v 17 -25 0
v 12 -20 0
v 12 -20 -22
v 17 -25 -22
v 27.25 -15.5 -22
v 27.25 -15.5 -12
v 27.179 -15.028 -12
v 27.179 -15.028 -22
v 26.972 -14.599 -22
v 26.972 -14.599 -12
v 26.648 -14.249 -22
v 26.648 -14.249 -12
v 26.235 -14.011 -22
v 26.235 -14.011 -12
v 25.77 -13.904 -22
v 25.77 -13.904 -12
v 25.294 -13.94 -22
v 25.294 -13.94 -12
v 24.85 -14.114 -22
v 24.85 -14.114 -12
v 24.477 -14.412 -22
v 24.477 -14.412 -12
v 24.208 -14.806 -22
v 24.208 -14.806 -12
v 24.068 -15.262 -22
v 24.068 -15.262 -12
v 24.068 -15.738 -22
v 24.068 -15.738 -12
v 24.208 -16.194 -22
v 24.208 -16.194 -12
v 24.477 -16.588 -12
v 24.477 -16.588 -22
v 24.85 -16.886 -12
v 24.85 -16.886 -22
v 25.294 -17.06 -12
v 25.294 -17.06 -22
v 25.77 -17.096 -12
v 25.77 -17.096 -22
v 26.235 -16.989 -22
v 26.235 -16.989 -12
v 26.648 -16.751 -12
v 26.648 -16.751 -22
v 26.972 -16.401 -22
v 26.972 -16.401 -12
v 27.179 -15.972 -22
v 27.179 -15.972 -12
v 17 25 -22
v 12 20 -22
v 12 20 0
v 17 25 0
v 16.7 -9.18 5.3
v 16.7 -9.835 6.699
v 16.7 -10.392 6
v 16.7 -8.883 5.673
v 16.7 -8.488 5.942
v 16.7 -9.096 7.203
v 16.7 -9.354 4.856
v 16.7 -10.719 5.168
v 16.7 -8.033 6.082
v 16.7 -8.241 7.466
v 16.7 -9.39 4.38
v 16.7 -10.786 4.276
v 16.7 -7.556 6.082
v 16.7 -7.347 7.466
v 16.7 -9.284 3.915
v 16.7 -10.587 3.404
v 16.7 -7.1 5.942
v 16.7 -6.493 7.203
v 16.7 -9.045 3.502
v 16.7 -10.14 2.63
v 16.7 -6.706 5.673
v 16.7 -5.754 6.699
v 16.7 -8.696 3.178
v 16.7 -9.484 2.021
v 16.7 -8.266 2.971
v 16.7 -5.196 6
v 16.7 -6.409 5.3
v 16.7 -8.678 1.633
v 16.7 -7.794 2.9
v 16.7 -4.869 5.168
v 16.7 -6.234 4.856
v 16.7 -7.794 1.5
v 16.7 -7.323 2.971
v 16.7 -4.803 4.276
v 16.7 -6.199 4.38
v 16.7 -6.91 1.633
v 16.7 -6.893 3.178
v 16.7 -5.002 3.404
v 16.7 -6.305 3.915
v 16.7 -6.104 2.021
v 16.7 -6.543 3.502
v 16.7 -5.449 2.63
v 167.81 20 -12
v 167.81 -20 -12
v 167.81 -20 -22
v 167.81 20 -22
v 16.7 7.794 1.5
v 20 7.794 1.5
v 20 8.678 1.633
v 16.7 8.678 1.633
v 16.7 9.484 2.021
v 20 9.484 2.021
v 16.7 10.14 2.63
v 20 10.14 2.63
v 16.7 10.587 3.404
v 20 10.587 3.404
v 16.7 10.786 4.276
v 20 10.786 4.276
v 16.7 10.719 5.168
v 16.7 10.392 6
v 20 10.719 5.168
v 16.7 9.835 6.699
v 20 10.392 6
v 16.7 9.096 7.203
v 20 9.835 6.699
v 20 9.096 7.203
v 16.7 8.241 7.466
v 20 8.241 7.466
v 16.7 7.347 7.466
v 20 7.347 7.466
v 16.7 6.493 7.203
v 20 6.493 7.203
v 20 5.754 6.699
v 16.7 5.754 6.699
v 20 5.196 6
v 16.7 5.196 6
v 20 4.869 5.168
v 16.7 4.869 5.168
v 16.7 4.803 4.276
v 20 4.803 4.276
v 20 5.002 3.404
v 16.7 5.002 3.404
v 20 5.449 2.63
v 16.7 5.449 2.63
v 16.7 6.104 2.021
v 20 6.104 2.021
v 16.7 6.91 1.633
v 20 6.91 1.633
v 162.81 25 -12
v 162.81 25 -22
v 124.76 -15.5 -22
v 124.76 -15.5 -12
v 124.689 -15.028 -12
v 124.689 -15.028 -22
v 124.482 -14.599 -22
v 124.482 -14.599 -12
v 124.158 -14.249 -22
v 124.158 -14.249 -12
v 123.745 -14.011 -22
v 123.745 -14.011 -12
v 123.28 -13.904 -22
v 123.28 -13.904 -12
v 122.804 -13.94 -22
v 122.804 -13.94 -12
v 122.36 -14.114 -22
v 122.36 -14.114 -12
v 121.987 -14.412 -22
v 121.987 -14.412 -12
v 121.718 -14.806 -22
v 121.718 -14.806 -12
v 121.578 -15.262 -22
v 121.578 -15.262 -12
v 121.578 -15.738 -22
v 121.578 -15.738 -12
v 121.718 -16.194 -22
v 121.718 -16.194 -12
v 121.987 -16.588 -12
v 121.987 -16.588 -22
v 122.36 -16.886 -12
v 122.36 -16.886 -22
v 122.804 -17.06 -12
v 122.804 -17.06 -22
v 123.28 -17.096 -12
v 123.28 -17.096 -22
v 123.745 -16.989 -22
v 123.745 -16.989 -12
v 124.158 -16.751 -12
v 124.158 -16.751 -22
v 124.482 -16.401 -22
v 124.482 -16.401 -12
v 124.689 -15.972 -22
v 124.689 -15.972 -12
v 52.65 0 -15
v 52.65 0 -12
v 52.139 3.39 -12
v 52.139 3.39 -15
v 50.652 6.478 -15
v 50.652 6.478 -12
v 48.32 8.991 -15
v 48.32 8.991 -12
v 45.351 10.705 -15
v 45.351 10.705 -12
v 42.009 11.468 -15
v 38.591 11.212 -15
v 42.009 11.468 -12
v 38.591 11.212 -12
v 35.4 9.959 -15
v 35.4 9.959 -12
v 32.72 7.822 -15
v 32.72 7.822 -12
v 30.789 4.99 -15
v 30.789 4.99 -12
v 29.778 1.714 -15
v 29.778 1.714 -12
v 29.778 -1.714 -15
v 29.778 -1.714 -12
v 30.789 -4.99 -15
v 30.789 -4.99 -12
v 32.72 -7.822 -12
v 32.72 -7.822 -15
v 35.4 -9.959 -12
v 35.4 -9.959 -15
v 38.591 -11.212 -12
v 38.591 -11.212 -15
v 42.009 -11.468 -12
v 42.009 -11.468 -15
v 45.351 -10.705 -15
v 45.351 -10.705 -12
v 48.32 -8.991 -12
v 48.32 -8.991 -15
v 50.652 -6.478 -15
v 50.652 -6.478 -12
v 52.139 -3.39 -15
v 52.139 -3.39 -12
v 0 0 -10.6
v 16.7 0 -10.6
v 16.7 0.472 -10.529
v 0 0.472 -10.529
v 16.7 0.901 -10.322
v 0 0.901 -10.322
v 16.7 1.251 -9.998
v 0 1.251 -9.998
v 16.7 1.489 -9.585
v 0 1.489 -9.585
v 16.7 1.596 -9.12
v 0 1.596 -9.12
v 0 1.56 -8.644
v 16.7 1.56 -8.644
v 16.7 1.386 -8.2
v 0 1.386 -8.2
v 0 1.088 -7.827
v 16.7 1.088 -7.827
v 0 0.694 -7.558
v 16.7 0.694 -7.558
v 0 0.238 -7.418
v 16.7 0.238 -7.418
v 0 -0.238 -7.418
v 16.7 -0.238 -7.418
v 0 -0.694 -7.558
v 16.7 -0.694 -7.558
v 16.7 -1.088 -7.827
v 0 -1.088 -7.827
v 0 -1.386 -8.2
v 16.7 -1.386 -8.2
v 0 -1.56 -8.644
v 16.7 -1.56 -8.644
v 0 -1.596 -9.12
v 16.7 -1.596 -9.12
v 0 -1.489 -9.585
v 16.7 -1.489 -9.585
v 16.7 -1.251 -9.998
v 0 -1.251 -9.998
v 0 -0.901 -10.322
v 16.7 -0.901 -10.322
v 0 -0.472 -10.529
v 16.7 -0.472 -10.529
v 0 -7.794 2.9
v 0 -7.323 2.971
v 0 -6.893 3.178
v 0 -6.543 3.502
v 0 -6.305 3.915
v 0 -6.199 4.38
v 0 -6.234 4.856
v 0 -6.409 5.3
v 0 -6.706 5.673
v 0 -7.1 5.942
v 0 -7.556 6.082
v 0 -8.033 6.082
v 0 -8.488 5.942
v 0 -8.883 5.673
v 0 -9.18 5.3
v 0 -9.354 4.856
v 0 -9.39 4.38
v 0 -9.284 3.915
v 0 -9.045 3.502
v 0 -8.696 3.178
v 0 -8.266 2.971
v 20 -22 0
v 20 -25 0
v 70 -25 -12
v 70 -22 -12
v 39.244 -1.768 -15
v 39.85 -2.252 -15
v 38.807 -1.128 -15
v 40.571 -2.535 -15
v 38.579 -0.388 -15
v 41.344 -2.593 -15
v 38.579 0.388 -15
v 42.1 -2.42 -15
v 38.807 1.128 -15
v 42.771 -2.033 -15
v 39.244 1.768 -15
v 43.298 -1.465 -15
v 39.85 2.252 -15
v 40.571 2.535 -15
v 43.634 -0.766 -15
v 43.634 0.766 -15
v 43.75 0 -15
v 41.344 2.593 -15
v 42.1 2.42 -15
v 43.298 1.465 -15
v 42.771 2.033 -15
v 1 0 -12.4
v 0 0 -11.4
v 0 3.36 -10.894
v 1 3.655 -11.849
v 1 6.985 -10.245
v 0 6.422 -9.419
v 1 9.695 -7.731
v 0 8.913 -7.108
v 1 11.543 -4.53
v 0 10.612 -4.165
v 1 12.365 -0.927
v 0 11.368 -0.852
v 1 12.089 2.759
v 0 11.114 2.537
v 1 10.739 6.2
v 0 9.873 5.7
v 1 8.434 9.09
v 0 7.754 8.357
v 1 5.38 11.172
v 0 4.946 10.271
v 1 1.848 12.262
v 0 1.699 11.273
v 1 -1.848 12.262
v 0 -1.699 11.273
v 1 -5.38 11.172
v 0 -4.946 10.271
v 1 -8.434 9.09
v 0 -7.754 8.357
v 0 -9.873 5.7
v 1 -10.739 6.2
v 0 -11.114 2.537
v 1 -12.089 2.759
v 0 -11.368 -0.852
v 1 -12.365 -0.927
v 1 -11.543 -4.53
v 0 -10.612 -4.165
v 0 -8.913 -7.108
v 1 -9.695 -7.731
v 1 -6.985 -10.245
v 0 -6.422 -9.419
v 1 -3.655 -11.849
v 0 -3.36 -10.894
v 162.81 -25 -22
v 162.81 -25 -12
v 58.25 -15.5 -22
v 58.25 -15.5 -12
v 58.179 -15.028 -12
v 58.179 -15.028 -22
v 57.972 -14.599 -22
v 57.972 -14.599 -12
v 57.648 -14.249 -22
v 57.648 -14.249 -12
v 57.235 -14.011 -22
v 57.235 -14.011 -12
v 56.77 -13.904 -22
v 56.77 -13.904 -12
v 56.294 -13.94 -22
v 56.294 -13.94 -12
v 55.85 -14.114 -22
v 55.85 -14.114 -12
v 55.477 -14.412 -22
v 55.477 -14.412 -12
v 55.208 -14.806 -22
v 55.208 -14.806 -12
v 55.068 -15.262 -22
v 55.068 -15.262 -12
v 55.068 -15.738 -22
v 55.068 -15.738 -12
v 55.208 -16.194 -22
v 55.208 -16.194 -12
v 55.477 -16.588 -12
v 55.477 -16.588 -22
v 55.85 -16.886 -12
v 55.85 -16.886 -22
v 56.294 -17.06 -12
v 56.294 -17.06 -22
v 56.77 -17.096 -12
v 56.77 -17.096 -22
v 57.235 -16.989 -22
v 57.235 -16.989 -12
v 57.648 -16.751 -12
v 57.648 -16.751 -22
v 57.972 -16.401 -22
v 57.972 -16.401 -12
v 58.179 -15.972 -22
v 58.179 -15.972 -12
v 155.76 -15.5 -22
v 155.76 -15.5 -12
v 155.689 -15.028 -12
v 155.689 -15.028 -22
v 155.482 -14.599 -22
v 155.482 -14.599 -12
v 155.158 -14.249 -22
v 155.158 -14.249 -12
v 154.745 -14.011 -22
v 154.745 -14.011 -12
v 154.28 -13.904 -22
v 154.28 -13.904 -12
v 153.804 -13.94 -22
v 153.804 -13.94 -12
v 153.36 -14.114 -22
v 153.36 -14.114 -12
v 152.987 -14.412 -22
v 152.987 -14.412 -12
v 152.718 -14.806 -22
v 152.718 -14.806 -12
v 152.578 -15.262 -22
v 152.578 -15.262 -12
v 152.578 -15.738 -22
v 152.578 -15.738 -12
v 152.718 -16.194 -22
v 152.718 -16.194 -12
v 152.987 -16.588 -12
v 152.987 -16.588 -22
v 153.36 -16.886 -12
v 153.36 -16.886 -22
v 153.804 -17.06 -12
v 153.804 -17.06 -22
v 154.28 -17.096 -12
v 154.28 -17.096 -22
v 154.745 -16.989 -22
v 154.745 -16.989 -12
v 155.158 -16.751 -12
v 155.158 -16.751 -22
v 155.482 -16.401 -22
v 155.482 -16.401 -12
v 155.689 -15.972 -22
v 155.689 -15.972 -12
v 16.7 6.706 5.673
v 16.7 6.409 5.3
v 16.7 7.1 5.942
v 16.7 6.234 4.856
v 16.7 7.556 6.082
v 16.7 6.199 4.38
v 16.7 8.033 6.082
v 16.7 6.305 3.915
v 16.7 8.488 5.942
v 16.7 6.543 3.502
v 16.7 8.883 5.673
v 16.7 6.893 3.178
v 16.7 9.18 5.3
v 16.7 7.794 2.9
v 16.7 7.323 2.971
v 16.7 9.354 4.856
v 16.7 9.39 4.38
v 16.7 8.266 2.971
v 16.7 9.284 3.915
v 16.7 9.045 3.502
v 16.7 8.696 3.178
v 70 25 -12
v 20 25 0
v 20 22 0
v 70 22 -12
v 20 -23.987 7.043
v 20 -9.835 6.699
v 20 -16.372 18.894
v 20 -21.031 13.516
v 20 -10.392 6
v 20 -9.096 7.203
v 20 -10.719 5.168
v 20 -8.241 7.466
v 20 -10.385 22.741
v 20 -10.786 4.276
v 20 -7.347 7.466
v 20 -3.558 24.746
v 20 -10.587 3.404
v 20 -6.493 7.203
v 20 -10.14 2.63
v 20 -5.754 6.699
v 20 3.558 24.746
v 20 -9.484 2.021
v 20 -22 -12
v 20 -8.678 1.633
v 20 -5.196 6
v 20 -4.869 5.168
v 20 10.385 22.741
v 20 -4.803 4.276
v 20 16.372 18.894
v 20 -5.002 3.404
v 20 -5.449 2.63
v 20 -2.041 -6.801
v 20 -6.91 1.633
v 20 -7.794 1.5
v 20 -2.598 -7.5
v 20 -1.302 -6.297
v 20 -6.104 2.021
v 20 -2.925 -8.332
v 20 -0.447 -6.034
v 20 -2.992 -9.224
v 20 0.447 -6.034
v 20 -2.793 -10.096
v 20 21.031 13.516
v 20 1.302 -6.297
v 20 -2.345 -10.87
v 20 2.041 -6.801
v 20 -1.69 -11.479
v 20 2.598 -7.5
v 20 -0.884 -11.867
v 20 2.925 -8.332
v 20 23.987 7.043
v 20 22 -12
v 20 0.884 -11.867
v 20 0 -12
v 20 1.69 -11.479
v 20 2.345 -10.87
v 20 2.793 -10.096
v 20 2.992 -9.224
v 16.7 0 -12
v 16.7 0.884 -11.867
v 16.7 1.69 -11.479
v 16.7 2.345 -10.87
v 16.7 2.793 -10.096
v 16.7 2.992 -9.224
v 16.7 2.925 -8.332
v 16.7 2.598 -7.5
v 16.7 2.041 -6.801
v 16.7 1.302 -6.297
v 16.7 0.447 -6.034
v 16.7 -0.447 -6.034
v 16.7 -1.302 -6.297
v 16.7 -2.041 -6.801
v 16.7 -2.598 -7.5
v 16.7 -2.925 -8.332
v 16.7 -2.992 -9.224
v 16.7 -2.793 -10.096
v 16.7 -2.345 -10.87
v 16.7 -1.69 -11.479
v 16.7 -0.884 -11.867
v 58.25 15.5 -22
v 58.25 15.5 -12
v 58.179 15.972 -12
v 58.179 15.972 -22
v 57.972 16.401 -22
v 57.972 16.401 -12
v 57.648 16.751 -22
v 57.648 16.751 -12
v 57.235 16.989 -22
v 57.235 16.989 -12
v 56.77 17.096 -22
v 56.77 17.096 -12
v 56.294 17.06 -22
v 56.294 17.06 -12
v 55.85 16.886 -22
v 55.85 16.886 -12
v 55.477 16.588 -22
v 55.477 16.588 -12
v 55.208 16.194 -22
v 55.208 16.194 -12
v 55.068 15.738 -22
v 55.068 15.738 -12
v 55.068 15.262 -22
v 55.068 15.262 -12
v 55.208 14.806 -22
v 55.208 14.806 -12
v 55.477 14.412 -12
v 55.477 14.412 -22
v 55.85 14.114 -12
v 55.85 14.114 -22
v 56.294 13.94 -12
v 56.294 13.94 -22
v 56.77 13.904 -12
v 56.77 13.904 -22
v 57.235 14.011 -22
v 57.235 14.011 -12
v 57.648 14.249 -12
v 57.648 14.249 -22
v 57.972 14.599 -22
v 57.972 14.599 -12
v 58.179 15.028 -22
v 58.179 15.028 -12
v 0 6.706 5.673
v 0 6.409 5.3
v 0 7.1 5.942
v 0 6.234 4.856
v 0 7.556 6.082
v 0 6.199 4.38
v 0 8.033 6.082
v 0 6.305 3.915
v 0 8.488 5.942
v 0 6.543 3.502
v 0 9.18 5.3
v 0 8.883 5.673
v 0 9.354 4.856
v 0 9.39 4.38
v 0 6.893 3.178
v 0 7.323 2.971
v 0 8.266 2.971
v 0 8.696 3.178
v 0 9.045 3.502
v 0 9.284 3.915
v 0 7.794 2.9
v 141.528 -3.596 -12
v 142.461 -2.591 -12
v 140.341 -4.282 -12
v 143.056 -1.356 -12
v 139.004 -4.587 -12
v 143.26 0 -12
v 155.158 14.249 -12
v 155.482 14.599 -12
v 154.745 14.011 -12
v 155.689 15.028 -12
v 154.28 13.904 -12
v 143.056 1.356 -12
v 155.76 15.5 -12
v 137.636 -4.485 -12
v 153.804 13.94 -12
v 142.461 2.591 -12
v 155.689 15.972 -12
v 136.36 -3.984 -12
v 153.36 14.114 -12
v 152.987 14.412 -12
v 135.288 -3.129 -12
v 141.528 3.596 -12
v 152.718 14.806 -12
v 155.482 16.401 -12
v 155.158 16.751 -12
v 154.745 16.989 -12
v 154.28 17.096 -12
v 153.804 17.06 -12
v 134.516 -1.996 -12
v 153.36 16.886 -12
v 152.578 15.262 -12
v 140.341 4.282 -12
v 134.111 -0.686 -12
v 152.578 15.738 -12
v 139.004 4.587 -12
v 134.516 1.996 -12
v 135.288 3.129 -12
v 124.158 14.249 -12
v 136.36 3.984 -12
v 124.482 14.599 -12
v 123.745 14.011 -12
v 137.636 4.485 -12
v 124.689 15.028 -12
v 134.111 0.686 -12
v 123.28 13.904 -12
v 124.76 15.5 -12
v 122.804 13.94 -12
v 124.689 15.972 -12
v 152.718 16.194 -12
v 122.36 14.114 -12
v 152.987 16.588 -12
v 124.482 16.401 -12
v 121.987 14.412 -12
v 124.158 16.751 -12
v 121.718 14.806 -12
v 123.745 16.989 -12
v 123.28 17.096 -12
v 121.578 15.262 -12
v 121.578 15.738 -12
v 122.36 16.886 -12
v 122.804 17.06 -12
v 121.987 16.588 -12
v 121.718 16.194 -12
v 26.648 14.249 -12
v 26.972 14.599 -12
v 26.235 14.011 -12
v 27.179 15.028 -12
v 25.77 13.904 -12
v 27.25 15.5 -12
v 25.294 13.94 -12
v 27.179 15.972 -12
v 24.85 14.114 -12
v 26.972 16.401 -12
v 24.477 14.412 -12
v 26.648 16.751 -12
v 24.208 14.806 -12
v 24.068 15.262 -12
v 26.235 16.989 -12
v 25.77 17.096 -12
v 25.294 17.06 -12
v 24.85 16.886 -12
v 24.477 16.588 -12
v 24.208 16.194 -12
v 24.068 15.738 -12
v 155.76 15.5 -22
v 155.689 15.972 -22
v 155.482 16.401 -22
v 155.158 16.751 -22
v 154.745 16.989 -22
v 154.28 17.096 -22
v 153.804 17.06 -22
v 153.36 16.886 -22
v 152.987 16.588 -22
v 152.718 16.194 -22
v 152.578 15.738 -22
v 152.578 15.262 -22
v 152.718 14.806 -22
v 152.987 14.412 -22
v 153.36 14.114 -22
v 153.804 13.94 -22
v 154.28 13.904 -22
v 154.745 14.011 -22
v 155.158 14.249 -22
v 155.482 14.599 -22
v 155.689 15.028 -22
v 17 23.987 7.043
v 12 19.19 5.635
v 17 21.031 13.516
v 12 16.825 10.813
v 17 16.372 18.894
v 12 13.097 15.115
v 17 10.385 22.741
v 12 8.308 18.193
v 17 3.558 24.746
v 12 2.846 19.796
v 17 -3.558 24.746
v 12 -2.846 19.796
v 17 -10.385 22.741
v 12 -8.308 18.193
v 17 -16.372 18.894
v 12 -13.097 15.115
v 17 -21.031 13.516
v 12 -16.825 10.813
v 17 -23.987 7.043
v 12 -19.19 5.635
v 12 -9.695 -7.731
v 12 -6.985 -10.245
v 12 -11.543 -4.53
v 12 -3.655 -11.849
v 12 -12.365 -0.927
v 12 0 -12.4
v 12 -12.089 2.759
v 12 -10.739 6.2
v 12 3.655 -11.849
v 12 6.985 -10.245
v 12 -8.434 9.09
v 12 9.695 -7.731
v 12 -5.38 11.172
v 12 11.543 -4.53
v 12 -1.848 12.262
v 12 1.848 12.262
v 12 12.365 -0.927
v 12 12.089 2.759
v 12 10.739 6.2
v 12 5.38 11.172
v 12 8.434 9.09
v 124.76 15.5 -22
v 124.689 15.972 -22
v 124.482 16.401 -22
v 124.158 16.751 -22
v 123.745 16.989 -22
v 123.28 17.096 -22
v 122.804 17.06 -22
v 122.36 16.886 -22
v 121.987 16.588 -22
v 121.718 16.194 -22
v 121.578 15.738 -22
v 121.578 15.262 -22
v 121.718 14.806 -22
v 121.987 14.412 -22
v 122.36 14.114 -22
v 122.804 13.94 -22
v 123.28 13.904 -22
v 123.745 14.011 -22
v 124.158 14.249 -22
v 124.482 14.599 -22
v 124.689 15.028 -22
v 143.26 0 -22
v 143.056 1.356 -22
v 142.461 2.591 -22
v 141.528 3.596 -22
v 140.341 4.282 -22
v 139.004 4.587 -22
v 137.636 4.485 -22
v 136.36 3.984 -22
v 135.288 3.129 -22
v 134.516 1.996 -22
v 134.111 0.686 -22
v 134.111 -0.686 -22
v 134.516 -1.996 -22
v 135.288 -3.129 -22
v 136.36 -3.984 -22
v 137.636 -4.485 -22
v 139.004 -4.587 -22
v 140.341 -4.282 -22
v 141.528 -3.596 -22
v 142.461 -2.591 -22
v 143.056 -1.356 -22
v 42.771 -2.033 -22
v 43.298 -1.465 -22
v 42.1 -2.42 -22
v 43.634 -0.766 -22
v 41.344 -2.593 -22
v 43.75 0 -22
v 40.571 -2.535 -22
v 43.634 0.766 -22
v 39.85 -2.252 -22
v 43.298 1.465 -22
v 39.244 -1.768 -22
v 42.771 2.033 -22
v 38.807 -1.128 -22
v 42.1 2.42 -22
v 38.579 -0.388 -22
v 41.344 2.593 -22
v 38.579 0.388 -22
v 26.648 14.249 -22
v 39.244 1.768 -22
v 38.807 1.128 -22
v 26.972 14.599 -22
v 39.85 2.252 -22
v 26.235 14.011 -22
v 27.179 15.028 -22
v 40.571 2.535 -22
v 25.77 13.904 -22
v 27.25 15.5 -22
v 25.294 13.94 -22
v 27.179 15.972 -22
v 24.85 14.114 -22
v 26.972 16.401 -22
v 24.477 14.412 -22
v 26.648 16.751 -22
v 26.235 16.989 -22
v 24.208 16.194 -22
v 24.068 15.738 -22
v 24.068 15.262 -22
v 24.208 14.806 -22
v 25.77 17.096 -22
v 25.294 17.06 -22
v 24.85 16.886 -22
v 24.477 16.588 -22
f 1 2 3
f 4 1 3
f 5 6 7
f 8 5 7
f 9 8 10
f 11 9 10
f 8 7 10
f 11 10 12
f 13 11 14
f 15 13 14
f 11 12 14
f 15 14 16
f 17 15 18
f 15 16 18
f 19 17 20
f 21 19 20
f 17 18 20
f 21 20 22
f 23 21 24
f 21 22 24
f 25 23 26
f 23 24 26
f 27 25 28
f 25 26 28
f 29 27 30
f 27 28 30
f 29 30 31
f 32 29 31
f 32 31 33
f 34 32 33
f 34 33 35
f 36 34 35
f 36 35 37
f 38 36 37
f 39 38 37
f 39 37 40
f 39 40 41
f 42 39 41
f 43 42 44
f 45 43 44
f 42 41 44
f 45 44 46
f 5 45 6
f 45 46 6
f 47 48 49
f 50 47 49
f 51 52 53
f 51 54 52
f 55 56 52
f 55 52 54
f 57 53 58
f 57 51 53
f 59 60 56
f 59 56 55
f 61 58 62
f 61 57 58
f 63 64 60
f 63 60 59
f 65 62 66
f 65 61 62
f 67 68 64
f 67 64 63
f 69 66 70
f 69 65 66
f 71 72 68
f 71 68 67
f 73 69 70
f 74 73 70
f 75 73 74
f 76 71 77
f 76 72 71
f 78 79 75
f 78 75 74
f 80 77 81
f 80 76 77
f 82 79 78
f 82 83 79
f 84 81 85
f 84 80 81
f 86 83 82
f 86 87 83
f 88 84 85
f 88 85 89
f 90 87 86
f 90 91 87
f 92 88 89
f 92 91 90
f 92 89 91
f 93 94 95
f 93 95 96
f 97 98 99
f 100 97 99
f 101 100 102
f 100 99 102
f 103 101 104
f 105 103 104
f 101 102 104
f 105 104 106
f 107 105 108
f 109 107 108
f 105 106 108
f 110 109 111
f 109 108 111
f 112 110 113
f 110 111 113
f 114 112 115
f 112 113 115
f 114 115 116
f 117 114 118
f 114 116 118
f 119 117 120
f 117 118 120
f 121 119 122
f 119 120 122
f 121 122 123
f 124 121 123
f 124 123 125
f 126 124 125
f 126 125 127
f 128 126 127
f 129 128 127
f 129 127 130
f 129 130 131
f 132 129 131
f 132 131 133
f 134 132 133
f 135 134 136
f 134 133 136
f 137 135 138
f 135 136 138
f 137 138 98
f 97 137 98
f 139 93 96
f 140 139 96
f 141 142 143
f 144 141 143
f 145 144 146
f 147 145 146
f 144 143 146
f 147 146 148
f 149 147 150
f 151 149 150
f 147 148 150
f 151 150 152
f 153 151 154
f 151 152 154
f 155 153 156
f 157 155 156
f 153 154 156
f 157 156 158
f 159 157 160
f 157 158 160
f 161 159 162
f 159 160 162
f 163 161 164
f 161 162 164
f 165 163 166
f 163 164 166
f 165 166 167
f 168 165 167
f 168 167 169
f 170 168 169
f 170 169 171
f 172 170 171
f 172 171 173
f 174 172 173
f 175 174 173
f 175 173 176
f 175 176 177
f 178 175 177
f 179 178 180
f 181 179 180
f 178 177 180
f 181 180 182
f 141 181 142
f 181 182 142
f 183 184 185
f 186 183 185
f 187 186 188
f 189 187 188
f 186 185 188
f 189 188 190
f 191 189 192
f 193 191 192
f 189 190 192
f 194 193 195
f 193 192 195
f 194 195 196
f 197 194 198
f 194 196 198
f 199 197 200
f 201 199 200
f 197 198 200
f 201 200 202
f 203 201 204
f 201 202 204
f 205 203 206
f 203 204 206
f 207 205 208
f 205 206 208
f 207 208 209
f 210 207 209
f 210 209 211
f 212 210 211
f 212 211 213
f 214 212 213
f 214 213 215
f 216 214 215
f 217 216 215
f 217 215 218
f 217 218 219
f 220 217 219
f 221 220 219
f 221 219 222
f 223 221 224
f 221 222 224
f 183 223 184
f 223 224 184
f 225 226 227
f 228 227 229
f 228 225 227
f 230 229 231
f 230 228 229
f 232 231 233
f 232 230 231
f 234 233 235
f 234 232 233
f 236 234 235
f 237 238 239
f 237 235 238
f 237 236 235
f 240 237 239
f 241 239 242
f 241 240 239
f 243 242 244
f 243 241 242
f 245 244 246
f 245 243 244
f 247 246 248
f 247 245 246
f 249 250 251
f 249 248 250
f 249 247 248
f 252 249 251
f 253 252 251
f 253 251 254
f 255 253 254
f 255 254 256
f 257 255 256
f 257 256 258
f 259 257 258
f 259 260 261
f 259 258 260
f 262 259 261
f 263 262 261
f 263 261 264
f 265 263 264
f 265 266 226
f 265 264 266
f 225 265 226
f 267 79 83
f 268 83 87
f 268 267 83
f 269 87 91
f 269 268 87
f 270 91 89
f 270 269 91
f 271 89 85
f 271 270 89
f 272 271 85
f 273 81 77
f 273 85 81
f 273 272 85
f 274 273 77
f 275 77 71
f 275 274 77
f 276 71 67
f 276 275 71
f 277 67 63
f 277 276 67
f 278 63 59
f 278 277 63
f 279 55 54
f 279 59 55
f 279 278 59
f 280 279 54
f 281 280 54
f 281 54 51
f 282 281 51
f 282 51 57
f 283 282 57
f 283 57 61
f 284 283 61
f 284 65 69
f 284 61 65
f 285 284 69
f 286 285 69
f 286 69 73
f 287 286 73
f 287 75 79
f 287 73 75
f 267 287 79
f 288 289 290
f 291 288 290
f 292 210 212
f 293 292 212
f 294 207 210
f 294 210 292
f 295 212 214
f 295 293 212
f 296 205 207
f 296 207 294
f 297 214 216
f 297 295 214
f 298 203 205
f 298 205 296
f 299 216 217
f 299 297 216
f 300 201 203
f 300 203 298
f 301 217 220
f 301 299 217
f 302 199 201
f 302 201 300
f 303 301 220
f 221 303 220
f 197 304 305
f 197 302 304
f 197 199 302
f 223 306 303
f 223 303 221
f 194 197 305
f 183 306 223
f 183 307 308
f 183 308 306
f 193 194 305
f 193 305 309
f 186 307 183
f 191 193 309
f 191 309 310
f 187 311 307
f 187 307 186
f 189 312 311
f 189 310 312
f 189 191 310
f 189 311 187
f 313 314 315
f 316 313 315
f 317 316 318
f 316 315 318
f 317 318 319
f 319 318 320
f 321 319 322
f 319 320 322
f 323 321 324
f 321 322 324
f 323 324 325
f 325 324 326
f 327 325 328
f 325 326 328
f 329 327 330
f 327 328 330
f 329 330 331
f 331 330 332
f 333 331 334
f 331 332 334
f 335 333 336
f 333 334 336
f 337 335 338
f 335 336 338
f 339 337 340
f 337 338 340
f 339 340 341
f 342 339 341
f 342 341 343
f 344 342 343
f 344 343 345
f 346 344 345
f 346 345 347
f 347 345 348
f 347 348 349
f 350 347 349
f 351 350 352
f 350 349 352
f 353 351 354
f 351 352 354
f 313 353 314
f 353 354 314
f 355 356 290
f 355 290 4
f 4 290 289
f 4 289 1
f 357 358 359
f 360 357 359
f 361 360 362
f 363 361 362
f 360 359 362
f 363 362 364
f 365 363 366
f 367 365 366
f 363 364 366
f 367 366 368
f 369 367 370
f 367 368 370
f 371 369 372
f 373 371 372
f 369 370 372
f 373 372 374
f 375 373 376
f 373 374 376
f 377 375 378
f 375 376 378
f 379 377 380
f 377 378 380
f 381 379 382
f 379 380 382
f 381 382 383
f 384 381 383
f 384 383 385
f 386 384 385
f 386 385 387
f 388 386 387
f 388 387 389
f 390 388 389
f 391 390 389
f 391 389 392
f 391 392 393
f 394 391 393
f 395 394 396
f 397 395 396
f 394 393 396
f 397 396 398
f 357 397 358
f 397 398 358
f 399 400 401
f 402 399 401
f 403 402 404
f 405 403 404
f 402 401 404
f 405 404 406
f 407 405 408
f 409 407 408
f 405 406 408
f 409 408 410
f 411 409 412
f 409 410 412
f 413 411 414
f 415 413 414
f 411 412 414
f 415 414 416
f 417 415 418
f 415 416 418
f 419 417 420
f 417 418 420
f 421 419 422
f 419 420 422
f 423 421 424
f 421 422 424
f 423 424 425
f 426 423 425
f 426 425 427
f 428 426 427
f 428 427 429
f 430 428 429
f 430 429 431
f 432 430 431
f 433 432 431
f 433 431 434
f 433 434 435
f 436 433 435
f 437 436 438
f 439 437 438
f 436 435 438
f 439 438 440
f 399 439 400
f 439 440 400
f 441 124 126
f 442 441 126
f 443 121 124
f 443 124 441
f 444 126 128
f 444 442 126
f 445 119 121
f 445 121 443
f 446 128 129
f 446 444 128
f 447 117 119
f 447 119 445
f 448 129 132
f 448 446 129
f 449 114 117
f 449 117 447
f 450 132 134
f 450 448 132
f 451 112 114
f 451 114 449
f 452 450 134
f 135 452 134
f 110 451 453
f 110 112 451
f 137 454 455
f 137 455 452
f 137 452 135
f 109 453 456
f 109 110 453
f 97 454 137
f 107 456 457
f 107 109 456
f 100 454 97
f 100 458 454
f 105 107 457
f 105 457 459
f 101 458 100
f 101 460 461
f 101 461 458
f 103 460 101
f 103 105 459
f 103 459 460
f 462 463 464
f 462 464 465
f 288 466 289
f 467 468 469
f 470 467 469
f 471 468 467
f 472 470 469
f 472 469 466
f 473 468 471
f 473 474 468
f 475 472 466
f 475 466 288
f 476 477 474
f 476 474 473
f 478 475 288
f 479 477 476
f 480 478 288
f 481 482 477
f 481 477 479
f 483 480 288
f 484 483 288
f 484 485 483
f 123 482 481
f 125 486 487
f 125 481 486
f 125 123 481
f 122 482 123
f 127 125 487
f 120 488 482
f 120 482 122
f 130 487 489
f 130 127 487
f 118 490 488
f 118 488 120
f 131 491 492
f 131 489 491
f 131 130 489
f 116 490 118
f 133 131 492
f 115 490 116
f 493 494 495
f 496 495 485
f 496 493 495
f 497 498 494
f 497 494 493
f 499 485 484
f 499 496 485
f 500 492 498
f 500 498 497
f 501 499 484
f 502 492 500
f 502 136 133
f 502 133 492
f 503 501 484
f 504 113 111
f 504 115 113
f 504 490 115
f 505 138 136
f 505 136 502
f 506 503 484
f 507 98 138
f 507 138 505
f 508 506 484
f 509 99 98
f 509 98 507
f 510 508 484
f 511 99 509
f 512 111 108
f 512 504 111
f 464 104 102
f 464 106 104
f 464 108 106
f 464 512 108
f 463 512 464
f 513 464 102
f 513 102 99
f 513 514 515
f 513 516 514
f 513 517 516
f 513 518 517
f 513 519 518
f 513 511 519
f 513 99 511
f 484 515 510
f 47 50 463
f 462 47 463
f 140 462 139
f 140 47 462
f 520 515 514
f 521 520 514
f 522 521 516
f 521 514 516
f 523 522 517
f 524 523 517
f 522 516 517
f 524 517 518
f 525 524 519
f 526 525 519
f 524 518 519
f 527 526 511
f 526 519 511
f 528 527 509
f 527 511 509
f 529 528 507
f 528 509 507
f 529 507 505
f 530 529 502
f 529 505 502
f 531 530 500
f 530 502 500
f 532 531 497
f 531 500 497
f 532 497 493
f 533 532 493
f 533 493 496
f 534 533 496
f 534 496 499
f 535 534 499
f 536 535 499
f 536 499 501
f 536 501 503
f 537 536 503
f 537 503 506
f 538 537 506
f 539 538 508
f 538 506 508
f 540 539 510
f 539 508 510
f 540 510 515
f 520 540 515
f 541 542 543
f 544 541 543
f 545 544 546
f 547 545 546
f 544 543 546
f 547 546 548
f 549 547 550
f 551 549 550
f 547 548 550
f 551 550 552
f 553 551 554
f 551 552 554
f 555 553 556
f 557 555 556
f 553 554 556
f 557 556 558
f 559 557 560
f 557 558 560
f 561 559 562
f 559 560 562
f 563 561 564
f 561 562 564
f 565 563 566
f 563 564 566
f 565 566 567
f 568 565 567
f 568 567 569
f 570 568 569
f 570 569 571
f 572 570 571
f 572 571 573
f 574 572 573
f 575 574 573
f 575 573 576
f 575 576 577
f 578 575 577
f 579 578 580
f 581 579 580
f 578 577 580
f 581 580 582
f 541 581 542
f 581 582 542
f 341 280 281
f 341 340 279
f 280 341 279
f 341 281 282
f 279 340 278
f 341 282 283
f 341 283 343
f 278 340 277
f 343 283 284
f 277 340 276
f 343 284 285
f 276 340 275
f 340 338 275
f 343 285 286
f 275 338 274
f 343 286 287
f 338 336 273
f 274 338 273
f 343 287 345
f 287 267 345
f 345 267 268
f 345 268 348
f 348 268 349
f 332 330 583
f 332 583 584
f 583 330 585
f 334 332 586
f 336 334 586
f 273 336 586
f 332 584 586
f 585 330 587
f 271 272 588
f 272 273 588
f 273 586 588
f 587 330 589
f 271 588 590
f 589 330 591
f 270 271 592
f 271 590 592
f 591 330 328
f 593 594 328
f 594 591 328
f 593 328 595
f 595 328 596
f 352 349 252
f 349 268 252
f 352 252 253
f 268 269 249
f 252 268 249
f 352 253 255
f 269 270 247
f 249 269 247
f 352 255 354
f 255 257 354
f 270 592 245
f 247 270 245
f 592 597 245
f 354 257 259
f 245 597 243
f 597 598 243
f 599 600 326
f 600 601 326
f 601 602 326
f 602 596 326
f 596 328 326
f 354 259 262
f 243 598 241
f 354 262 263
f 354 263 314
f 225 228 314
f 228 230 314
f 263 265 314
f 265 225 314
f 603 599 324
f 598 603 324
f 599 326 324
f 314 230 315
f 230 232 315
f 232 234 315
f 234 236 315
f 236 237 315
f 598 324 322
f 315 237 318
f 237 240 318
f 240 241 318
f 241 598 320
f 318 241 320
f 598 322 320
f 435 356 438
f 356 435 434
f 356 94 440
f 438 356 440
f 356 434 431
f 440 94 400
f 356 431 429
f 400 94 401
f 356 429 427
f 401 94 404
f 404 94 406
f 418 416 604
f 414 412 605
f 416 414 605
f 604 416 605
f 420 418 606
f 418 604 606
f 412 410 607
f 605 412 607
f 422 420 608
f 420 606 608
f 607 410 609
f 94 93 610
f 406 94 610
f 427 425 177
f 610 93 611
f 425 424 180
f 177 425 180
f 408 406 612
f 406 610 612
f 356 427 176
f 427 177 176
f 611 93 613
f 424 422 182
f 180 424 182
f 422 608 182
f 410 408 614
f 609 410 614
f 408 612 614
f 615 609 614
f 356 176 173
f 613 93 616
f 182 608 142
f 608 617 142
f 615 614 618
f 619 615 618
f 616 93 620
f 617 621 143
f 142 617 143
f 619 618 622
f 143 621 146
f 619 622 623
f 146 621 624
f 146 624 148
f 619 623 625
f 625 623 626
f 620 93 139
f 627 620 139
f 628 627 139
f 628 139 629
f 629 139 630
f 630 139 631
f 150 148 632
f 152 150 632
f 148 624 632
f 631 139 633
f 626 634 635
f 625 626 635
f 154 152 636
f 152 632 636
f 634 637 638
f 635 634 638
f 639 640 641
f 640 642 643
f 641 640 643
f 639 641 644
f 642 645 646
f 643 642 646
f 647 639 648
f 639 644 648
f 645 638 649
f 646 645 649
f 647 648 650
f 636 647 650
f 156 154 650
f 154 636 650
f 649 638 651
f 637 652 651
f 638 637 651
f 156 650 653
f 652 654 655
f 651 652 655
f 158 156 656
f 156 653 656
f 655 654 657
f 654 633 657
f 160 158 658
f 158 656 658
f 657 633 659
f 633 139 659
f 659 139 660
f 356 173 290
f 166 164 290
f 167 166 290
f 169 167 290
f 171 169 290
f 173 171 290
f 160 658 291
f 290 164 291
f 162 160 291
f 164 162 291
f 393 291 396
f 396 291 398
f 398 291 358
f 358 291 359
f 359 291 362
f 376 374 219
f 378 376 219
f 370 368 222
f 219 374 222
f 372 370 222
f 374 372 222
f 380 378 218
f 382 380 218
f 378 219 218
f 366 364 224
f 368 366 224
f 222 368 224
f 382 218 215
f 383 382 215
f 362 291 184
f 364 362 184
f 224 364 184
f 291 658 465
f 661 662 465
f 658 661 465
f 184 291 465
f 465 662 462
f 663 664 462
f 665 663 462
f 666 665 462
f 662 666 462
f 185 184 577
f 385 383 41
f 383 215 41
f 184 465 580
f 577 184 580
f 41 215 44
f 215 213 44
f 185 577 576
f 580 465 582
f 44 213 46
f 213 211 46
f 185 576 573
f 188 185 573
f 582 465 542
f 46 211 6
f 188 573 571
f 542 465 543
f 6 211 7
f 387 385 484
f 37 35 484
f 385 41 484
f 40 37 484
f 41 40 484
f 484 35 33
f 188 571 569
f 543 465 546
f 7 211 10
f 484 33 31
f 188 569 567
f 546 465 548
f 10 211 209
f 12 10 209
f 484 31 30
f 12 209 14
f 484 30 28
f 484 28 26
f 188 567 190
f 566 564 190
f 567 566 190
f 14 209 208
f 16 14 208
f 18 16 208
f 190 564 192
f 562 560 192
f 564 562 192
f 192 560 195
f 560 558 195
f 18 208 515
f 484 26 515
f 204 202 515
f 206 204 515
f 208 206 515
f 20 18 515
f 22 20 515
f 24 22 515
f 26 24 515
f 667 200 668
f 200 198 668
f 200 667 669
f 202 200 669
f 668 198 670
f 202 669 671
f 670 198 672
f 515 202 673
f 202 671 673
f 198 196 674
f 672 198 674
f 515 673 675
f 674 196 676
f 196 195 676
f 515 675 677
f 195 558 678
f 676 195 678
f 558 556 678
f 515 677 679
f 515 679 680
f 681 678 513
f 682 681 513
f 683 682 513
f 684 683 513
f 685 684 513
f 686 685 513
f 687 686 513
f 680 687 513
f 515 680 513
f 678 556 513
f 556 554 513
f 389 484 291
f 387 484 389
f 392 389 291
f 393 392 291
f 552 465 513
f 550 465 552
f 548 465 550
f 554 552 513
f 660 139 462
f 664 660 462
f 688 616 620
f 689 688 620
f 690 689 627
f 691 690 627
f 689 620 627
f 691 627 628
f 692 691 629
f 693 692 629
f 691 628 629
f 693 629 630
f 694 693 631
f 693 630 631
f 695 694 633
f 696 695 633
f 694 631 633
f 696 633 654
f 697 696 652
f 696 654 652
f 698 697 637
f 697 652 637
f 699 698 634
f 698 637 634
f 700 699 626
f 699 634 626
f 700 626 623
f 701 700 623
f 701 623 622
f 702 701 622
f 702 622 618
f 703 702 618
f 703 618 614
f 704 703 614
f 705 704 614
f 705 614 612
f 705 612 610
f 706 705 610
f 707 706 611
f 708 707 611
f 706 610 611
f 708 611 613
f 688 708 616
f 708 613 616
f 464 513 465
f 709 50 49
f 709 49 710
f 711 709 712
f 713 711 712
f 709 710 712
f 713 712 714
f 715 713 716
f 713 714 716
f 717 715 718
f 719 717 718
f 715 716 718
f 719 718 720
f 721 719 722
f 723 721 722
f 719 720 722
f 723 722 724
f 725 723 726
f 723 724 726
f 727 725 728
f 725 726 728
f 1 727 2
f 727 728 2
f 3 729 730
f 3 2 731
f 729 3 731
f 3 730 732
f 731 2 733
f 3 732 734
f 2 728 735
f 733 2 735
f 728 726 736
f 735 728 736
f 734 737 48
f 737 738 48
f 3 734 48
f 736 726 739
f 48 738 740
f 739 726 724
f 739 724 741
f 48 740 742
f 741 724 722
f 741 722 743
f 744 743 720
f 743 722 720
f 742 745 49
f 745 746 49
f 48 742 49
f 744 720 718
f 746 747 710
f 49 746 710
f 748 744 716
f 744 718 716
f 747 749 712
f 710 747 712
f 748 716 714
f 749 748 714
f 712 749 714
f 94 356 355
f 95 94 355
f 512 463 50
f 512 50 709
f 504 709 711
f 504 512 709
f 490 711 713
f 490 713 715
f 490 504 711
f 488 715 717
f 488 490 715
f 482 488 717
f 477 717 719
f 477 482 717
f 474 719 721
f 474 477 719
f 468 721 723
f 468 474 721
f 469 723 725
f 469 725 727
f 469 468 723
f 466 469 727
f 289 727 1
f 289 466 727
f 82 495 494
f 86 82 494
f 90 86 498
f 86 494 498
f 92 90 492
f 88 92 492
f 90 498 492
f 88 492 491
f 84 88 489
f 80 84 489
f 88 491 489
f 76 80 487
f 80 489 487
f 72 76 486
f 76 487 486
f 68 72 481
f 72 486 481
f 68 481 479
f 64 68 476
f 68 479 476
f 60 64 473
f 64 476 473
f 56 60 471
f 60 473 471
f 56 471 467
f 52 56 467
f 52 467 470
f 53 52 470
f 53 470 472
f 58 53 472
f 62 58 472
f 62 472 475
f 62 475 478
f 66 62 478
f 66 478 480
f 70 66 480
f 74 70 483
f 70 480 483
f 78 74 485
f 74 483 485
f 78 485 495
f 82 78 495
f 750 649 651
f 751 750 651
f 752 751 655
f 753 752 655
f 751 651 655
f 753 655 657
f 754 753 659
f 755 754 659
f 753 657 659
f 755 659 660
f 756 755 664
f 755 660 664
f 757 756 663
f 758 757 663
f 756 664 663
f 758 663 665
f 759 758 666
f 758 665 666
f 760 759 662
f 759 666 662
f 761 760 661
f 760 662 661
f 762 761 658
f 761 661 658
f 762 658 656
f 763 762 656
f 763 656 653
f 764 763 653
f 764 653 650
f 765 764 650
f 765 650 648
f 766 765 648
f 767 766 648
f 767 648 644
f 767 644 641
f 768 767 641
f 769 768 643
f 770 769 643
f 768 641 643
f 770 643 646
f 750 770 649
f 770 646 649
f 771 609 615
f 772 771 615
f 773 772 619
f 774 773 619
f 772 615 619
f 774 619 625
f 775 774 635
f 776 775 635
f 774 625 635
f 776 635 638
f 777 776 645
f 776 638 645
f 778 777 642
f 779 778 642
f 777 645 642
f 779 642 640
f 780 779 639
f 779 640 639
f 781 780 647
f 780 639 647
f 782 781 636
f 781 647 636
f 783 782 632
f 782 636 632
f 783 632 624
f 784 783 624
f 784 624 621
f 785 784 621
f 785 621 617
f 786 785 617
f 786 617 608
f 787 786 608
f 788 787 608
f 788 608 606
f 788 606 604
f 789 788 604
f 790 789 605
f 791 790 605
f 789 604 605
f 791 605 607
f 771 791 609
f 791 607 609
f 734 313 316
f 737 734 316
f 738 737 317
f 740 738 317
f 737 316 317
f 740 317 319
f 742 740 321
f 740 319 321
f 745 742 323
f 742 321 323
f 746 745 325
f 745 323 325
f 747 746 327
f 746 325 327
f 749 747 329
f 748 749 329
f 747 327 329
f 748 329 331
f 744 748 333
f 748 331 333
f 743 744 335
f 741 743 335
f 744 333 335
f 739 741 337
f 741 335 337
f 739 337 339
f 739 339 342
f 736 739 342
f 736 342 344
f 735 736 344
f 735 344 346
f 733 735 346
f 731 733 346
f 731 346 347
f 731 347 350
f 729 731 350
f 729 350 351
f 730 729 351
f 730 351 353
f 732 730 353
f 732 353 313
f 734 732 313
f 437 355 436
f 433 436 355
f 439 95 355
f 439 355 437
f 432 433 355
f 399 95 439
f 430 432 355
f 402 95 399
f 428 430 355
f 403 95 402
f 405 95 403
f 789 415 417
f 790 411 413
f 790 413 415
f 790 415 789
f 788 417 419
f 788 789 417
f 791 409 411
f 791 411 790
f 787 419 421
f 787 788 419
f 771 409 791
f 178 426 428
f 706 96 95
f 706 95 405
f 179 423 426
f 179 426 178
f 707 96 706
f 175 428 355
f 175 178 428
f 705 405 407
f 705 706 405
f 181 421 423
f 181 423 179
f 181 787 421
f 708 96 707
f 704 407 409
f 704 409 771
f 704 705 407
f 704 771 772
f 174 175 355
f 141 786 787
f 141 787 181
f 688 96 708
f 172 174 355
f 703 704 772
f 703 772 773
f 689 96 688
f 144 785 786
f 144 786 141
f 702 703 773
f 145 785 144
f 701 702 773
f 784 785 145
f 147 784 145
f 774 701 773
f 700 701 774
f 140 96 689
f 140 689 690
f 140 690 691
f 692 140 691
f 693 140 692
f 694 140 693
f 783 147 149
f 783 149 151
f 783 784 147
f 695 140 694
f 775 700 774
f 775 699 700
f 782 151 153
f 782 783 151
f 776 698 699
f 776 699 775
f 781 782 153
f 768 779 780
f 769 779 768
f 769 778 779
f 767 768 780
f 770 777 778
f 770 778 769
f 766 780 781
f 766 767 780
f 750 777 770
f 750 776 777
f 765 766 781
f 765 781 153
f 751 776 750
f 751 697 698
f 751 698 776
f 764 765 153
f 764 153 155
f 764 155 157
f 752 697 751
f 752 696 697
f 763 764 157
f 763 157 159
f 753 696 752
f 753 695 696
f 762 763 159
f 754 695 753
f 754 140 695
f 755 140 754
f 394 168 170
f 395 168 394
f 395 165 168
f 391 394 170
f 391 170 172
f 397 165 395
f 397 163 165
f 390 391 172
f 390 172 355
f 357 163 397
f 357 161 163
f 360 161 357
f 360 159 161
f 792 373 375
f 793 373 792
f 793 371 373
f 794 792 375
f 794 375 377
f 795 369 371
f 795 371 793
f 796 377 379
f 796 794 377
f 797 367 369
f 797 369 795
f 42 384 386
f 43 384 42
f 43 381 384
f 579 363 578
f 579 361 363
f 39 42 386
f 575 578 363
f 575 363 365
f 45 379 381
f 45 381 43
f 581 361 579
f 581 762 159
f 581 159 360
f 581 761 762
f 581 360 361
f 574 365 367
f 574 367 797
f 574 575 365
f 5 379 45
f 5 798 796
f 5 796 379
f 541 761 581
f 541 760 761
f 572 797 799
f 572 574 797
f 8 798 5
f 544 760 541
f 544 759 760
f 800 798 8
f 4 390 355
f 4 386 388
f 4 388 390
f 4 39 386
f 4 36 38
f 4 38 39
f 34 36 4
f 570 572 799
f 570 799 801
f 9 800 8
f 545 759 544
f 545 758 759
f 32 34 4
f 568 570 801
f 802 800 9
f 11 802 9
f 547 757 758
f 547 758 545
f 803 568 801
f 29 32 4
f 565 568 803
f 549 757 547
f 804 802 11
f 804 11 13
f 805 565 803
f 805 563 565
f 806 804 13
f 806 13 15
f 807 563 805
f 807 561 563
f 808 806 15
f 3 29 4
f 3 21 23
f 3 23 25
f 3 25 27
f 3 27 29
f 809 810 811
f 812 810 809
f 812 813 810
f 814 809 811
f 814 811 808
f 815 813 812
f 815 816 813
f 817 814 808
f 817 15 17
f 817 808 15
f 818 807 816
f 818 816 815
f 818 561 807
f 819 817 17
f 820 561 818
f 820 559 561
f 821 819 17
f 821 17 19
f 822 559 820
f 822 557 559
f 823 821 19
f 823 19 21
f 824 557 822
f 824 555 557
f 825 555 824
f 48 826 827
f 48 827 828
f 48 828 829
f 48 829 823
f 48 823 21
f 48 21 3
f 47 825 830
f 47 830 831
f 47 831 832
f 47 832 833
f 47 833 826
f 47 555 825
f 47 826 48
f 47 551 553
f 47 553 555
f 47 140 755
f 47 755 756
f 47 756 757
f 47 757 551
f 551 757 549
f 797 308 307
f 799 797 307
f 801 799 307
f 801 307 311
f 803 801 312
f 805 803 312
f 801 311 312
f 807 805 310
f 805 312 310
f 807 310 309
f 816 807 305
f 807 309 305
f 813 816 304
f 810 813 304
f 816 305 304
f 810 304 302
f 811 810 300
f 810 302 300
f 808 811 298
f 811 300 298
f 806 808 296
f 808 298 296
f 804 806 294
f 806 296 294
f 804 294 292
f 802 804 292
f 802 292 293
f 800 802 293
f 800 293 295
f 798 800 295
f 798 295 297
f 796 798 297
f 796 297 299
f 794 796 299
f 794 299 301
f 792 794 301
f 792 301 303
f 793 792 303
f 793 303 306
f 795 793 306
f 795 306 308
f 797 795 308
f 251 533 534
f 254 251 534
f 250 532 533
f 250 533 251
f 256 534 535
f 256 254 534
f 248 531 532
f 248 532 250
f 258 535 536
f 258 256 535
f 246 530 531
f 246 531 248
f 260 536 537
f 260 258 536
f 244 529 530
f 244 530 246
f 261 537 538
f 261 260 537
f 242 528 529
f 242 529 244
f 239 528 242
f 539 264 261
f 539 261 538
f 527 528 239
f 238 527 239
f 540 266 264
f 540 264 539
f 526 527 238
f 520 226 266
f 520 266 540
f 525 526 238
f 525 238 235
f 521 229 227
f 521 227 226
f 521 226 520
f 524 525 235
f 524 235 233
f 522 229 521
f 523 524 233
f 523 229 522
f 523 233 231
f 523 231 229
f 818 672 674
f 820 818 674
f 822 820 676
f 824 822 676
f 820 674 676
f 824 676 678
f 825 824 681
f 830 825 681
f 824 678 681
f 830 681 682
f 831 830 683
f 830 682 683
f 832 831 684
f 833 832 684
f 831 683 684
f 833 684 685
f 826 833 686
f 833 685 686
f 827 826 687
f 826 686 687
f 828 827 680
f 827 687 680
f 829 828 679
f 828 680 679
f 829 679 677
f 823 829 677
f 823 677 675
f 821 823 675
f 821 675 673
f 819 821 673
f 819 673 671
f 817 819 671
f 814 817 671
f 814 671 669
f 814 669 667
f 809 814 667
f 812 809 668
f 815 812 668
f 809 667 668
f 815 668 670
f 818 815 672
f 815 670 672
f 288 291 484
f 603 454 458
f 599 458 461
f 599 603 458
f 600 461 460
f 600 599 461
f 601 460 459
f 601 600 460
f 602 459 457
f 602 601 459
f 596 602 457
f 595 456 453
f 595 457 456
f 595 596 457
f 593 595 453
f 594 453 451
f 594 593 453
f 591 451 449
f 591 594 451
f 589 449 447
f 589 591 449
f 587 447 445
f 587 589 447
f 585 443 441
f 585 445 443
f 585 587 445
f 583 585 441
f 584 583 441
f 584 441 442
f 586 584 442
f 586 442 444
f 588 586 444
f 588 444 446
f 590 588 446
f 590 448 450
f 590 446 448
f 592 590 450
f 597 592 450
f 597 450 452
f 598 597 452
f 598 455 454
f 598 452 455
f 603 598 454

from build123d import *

# Parameters (mm, degrees)
SKETCH_2_R          = 12.4
SKETCH_2_R_2        = 1.6
EXTRUDE_1_DEPTH     = 20
EXTRUDE_2_DEPTH     = 8
SKETCH_5_W          = 155.81
SKETCH_5_H          = 50
EXTRUDE_3_DEPTH     = 10
SKETCH_6_R          = 1.6
SKETCH_6_R_2        = 2.6
SKETCH_6_R_3        = 4.6
CUT_EXTRUDE_1_DEPTH = 10
SKETCH_7_R          = 3
CUT_EXTRUDE_2_DEPTH = 3.3
SKETCH_8_R          = 11.5
CUT_EXTRUDE_3_DEPTH = 3
EXTRUDE_4_DEPTH     = 3
EXTRUDE_5_DEPTH     = 3
CHAMFER_1_SIZE      = 5
CHAMFER_2_SIZE      = 1


with BuildPart() as part:
    # 草图2 → 凸台-拉伸1 (new body)
    with BuildSketch(Plane(origin=(0, 0, 0), x_dir=(0, 0, -1), z_dir=(1, 0, 0))):
        Circle(SKETCH_2_R)
        with Locations((9, 0)):
            Circle(SKETCH_2_R_2, mode=Mode.SUBTRACT)
        with Locations((-4.5, -7.794228634)):
            Circle(SKETCH_2_R_2, mode=Mode.SUBTRACT)
        with Locations((-4.5, 7.794228634)):
            Circle(SKETCH_2_R_2, mode=Mode.SUBTRACT)
    extrude(amount=EXTRUDE_1_DEPTH)

    # 草图3 → 凸台-拉伸2 (add)
    with BuildSketch(Plane(origin=(20, 0, 0), x_dir=(0, 0, -1), z_dir=(1, 0, 0))):
        with BuildLine():
            Line((12, 25), (0, 25))
            ThreePointArc((0, 25), (-25, 0), (0, -25))
            Line((0, -25), (12, -25))
            Line((12, -25), (12, -3.12409987))
            ThreePointArc((12, -3.12409987), (-12.4, 0), (12, 3.12409987))
            Line((12, 3.12409987), (12, 25))
        make_face()
    extrude(amount=-EXTRUDE_2_DEPTH)

    # 草图5 → 凸台-拉伸3 (add)
    with BuildSketch(Plane(origin=(0, 0, -12), x_dir=(-1, 0, 0), z_dir=(0, 0, -1))):
        with Locations((-89.905, 0)):
            Rectangle(SKETCH_5_W, SKETCH_5_H)
    extrude(amount=EXTRUDE_3_DEPTH)

    # 草图6 → 切除-拉伸1 (cut)
    with BuildSketch(Plane.XY.offset(-12)):
        with Locations((25.65, 15.5)):
            Circle(SKETCH_6_R)
        with Locations((56.65, 15.5)):
            Circle(SKETCH_6_R)
        with Locations((56.65, -15.5)):
            Circle(SKETCH_6_R)
        with Locations((25.65, -15.5)):
            Circle(SKETCH_6_R)
        with Locations((41.15, 0)):
            Circle(SKETCH_6_R_2)
        with Locations((138.66, 0)):
            Circle(SKETCH_6_R_3)
        with Locations((123.16, 15.5)):
            Circle(SKETCH_6_R)
        with Locations((154.16, 15.5)):
            Circle(SKETCH_6_R)
        with Locations((154.16, -15.5)):
            Circle(SKETCH_6_R)
        with Locations((123.16, -15.5)):
            Circle(SKETCH_6_R)
    extrude(amount=-CUT_EXTRUDE_1_DEPTH, mode=Mode.SUBTRACT)

    # 草图7 → 切除-拉伸2 (cut)
    with BuildSketch(Plane(origin=(20, 0, 0), x_dir=(0, 0, -1), z_dir=(1, 0, 0))):
        with Locations((-4.5, 7.794228634)):
            Circle(SKETCH_7_R)
        with Locations((9, 0)):
            Circle(SKETCH_7_R)
        with Locations((-4.5, -7.794228634)):
            Circle(SKETCH_7_R)
    extrude(amount=-CUT_EXTRUDE_2_DEPTH, mode=Mode.SUBTRACT)

    # 草图8 → 切除-拉伸3 (cut)
    with BuildSketch(Plane.XY.offset(-12)):
        with Locations((41.15, 0)):
            Circle(SKETCH_8_R)
    extrude(amount=-CUT_EXTRUDE_3_DEPTH, mode=Mode.SUBTRACT)

    # 草图10 → 凸台-拉伸4 (add)
    with BuildSketch(Plane.XZ.offset(25)):
        Polygon((20, 0), (70, -12), (20, -12), align=None)
    extrude(amount=-EXTRUDE_4_DEPTH)

    # 草图11 → 凸台-拉伸5 (add)
    with BuildSketch(Plane(origin=(0, 25, 0), x_dir=(1, 0, 0), z_dir=(0, 1, 0))):
        Polygon((20, 0), (70, 12), (20, 12), align=None)
    extrude(amount=-EXTRUDE_5_DEPTH)

    # 倒角1
    chamfer_1_edges = [part.edges().sort_by_distance(p)[0] for p in [
        (12, 0, 25),
        (12, 25, -11),
        (12, -25, -11),
        (167.81, 25, -17),
        (167.81, -25, -17),
    ]]
    chamfer(chamfer_1_edges, length=CHAMFER_1_SIZE)

    # 倒角2
    chamfer_2_edges = [part.edges().sort_by_distance(p)[0] for p in [
        (0, 0, 12.4),
    ]]
    chamfer(chamfer_2_edges, length=CHAMFER_2_SIZE)


solid = part.part
